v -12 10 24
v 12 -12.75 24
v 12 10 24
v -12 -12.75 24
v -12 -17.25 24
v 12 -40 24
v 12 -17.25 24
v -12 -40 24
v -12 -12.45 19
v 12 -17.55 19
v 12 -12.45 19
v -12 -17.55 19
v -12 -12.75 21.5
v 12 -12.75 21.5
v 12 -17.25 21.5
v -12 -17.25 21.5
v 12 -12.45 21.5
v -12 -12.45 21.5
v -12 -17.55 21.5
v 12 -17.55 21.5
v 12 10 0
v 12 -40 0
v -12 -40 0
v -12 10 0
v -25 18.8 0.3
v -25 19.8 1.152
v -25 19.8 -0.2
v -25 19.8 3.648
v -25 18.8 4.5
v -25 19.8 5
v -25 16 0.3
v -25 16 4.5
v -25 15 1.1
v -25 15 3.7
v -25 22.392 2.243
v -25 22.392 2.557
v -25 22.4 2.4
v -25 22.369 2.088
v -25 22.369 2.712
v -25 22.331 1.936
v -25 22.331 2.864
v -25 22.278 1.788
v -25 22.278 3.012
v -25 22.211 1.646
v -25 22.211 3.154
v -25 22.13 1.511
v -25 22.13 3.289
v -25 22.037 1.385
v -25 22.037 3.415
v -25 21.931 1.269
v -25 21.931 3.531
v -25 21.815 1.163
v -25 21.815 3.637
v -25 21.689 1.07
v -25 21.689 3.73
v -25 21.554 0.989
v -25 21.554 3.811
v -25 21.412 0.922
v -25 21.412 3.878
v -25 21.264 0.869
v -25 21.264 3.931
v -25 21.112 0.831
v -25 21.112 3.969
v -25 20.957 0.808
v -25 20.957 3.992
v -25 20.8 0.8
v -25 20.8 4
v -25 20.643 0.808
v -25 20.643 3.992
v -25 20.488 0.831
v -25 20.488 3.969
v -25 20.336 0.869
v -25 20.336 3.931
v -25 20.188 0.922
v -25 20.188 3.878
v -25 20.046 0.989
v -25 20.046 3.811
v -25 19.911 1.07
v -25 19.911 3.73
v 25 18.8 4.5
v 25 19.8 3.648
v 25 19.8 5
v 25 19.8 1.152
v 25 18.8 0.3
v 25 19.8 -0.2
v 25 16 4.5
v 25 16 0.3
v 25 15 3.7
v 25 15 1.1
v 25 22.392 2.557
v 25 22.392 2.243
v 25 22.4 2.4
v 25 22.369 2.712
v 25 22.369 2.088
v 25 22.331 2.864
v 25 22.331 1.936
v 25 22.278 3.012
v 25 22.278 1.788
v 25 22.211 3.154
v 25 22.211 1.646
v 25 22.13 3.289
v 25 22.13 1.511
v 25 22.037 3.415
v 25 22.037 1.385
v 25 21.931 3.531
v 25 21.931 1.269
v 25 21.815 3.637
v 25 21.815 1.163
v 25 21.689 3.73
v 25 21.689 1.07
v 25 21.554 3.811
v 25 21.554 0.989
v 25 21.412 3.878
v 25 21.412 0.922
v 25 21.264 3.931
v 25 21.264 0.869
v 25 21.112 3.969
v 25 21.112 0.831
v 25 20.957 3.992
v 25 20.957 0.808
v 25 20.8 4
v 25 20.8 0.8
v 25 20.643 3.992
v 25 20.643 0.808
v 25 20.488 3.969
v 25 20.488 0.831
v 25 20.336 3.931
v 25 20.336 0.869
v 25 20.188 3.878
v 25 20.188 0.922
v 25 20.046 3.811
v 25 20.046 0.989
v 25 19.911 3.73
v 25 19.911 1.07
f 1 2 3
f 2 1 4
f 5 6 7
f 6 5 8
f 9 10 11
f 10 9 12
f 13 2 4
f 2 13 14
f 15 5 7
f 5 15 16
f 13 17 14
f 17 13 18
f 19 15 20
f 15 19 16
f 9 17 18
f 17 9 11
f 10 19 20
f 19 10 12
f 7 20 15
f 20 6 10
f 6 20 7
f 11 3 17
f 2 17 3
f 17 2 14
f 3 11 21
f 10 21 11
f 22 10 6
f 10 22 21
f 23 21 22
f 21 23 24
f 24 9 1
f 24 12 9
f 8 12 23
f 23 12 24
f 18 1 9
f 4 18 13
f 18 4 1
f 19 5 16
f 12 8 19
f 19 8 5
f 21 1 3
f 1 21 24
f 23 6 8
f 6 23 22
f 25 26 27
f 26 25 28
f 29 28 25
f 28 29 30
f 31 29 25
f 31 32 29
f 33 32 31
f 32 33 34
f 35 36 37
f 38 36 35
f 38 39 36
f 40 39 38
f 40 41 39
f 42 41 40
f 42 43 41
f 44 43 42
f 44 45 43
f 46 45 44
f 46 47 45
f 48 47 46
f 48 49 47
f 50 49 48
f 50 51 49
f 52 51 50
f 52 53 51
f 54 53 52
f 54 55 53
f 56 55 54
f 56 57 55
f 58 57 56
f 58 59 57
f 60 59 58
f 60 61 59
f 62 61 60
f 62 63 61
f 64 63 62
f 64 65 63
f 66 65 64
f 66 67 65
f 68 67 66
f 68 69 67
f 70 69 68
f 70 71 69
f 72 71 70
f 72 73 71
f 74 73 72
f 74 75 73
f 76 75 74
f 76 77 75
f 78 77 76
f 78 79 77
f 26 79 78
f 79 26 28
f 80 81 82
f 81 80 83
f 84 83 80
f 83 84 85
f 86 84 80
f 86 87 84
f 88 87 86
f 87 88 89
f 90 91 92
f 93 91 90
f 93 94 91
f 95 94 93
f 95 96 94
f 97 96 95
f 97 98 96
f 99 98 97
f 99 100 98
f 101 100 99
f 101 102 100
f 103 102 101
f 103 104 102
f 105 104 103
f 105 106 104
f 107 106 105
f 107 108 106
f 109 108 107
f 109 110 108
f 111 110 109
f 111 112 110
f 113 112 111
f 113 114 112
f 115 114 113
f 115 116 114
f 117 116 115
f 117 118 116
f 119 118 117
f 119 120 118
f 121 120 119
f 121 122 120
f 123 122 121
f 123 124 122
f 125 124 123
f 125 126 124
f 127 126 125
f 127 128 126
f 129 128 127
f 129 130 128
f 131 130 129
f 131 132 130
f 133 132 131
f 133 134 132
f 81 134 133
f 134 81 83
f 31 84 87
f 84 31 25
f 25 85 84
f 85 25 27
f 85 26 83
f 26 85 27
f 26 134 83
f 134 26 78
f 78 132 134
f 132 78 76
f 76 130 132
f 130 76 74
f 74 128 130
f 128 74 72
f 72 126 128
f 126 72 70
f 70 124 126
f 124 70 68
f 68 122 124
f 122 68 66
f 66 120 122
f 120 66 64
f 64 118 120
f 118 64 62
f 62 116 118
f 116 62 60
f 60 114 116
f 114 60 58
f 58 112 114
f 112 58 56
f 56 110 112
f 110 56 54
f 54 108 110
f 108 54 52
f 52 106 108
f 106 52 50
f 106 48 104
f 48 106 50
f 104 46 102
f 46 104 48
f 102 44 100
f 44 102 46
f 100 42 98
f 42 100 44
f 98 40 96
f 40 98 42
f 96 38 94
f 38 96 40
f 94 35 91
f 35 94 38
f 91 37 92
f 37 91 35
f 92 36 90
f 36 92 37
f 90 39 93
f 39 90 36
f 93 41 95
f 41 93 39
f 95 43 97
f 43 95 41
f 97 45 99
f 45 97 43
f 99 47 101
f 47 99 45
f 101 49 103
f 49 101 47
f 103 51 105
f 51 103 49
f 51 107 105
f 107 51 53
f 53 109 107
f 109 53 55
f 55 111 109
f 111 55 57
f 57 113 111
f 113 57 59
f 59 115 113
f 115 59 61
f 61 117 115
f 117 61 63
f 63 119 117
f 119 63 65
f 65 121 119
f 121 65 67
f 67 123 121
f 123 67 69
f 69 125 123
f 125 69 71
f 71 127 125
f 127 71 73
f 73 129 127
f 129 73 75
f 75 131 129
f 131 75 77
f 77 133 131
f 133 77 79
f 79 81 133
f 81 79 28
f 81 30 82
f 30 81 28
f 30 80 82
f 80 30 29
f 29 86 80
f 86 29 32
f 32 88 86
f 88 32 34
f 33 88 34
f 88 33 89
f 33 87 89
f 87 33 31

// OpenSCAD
// file: ../modules/spline_profile.scad
// ====================================================================
// Cellophane Spline Groove & Snap-in Locking Strip Module
// Retention mechanism to hold packaging plastic taut without screws
// ====================================================================
include <../config.scad>

// Negative volume for cutting the spline groove into any beam surface
// Oriented along X axis, cut into -Z face
module spline_groove_negative(length = 100) {
    translate([0, 0, -GROOVE_DEPTH / 2])
    union() {
        // Main channel
        cube([length, GROOVE_WIDTH, GROOVE_DEPTH], center = true);
        
        // Retention undercuts / wedge lip at depth
        translate([0, 0, -GROOVE_DEPTH / 4])
        cube([length, GROOVE_WIDTH + 0.6, GROOVE_DEPTH / 2], center = true);
    }
}

// 2D Profile of the snap-in locking spline clip
module spline_clip_profile_2d() {
    w = SPLINE_WIDTH;
    h = SPLINE_HEIGHT;
    union() {
        // Chamfered lead-in nose
        polygon(points=[
            [-w/2 + 0.8, 0],
            [ w/2 - 0.8, 0],
            [ w/2, 1.0],
            [ w/2, h - 1.0],
            [ w/2 + 0.5, h], // Outer retention lip
            [-w/2 - 0.5, h], // Outer retention lip
            [-w/2, h - 1.0],
            [-w/2, 1.0]
        ]);
        
        // Gripping top ridge for thumb pressing and removal
        translate([0, h + 1.0])
        circle(r = 1.6);
    }
}

// 3D Snap-in Locking Spline Clip (cut to specified length)
module spline_clip(length = 150) {
    rotate([0, 90, 0])
    linear_extrude(height = length, center = true) {
        spline_clip_profile_2d();
    }
}
// file: ../config.scad
// ====================================================================
// Bambu Lab A1 Enclosure - Global Configuration Parameters
// 100% 3D Printable, Hardware-Free Modular Enclosure
// ====================================================================

// --- Print Bed Limits ---
MAX_PRINT_X = 256;
MAX_PRINT_Y = 256;
MAX_PRINT_Z = 256;
SAFE_PART_MAX_LEN = 240; // Safety margin for brim and skirt

// --- Internal Enclosure Dimensions (mm) ---
// Sized for Bambu Lab A1 bed-slinger travel, right poop bucket, and top BMCU 370c
INTERNAL_WIDTH  = 560; // X axis clearance (A1 + toolhead + right poop bucket)
INTERNAL_DEPTH  = 580; // Y axis clearance (Bed travel + rear cable loop buffer)
INTERNAL_HEIGHT = 710; // Z axis clearance (Gantry + BMCU 370c rotating mount + spool)

// --- Frame Profile Dimensions ---
BEAM_WIDTH  = 24;  // Beam thickness X/Y (mm)
BEAM_HEIGHT = 24;  // Beam thickness Z (mm)
WALL_THICKNESS = 3.2; // Shell thickness for robust frame rigidity

// Outer Dimensions
OUTER_WIDTH  = INTERNAL_WIDTH  + 2 * BEAM_WIDTH;  // ~608 mm
OUTER_DEPTH  = INTERNAL_DEPTH  + 2 * BEAM_WIDTH;  // ~628 mm
OUTER_HEIGHT = INTERNAL_HEIGHT + 2 * BEAM_HEIGHT; // ~758 mm

// --- Tolerances (FDM 3D Printing tuned for Bambu Lab A1 0.4mm nozzle) ---
TOL_TIGHT    = 0.15; // Tight press fit (spline clips)
TOL_DOVETAIL = 0.20; // Sliding interlock fit (dovetails & taper pins)
TOL_HINGE    = 0.30; // Free rotating hinge pins
TOL_LOOSE    = 0.40; // Clearance gaps

// --- Cellophane Spline Groove Specifications ---
GROOVE_WIDTH  = 4.5; // Width of U-channel on outer beam faces
GROOVE_DEPTH  = 5.0; // Depth of U-channel
SPLINE_WIDTH  = 4.2; // Width of snap-in locking spline strip
SPLINE_HEIGHT = 4.8; // Height of locking spline strip
SPLINE_LIP_R  = 0.6; // Small retention bead radius to pinch cellophane

// --- Tapered Dovetail & Pin Specifications ---
DOVETAIL_DEPTH  = 16.0; // Length of dovetail insert (mm)
DOVETAIL_BASE_W = 14.0; // Width at base of male dovetail
DOVETAIL_TIP_W  = 8.0;  // Width at narrowest point of taper
PIN_HOLE_DIA    = 6.0;  // Transverse locking pin hole diameter (tapered)
PIN_TAPER_ANGLE = 4.0;  // Degrees taper on locking pin for wedge action

// --- Segmentation Calculations (All segments < SAFE_PART_MAX_LEN) ---
CORNER_BLOCK_SIZE = 36; // 3-way cubic corner junction dimension

// Beam span between corners:
SPAN_X = INTERNAL_WIDTH  + 2 * BEAM_WIDTH - 2 * CORNER_BLOCK_SIZE;  // 608 - 72 = 536 mm
SPAN_Y = INTERNAL_DEPTH  + 2 * BEAM_WIDTH - 2 * CORNER_BLOCK_SIZE;  // 628 - 72 = 556 mm
SPAN_Z = INTERNAL_HEIGHT + 2 * BEAM_HEIGHT - 2 * CORNER_BLOCK_SIZE; // 758 - 72 = 686 mm

// Number of segments per span:
NUM_SEGS_X = 3; // 536 / 3 = 178.67 mm per segment
NUM_SEGS_Y = 3; // 556 / 3 = 185.33 mm per segment
NUM_SEGS_Z = 3; // 686 / 3 = 228.67 mm per segment

SEG_LEN_X = SPAN_X / NUM_SEGS_X;
SEG_LEN_Y = SPAN_Y / NUM_SEGS_Y;
SEG_LEN_Z = SPAN_Z / NUM_SEGS_Z;

// --- Filament PTFE Tube Routing (Bottom Side Beam) ---
PTFE_TUBE_OD  = 4.0; // Standard PTFE bowden tube outer diameter (mm)
PTFE_HOLE_DIA = 4.3; // Slip-fit through-hole diameter with retention grip
PTFE_TUBE_CNT = 4;   // 4 dedicated filament tubes for multi-material / drybox
PTFE_ANGLE    = 35;  // Upward angle toward toolhead/BMCU (degrees)

// --- Render Quality ($fn) ---
$fn = $preview ? 24 : 64;
// main file
// ====================================================================
// Cellophane Spline Fit Test Coupon (Quick 15-minute test print)
// Print this first with a scrap of packaging cellophane to test snap tension
// ====================================================================
include <../config.scad>
use <../modules/spline_profile.scad>

coupon_len = 50.0;

// Frame Groove Block
translate([0, -15, BEAM_HEIGHT/2])
difference() {
    cube([BEAM_WIDTH, coupon_len, BEAM_HEIGHT], center = true);
    
    // Spline groove on top face
    translate([0, 0, BEAM_HEIGHT/2])
    spline_groove_negative(length = coupon_len + 2);
}

// Matching Snap-in Spline Clip
translate([0, 15, SPLINE_HEIGHT/2])
spline_clip(length = coupon_len);
